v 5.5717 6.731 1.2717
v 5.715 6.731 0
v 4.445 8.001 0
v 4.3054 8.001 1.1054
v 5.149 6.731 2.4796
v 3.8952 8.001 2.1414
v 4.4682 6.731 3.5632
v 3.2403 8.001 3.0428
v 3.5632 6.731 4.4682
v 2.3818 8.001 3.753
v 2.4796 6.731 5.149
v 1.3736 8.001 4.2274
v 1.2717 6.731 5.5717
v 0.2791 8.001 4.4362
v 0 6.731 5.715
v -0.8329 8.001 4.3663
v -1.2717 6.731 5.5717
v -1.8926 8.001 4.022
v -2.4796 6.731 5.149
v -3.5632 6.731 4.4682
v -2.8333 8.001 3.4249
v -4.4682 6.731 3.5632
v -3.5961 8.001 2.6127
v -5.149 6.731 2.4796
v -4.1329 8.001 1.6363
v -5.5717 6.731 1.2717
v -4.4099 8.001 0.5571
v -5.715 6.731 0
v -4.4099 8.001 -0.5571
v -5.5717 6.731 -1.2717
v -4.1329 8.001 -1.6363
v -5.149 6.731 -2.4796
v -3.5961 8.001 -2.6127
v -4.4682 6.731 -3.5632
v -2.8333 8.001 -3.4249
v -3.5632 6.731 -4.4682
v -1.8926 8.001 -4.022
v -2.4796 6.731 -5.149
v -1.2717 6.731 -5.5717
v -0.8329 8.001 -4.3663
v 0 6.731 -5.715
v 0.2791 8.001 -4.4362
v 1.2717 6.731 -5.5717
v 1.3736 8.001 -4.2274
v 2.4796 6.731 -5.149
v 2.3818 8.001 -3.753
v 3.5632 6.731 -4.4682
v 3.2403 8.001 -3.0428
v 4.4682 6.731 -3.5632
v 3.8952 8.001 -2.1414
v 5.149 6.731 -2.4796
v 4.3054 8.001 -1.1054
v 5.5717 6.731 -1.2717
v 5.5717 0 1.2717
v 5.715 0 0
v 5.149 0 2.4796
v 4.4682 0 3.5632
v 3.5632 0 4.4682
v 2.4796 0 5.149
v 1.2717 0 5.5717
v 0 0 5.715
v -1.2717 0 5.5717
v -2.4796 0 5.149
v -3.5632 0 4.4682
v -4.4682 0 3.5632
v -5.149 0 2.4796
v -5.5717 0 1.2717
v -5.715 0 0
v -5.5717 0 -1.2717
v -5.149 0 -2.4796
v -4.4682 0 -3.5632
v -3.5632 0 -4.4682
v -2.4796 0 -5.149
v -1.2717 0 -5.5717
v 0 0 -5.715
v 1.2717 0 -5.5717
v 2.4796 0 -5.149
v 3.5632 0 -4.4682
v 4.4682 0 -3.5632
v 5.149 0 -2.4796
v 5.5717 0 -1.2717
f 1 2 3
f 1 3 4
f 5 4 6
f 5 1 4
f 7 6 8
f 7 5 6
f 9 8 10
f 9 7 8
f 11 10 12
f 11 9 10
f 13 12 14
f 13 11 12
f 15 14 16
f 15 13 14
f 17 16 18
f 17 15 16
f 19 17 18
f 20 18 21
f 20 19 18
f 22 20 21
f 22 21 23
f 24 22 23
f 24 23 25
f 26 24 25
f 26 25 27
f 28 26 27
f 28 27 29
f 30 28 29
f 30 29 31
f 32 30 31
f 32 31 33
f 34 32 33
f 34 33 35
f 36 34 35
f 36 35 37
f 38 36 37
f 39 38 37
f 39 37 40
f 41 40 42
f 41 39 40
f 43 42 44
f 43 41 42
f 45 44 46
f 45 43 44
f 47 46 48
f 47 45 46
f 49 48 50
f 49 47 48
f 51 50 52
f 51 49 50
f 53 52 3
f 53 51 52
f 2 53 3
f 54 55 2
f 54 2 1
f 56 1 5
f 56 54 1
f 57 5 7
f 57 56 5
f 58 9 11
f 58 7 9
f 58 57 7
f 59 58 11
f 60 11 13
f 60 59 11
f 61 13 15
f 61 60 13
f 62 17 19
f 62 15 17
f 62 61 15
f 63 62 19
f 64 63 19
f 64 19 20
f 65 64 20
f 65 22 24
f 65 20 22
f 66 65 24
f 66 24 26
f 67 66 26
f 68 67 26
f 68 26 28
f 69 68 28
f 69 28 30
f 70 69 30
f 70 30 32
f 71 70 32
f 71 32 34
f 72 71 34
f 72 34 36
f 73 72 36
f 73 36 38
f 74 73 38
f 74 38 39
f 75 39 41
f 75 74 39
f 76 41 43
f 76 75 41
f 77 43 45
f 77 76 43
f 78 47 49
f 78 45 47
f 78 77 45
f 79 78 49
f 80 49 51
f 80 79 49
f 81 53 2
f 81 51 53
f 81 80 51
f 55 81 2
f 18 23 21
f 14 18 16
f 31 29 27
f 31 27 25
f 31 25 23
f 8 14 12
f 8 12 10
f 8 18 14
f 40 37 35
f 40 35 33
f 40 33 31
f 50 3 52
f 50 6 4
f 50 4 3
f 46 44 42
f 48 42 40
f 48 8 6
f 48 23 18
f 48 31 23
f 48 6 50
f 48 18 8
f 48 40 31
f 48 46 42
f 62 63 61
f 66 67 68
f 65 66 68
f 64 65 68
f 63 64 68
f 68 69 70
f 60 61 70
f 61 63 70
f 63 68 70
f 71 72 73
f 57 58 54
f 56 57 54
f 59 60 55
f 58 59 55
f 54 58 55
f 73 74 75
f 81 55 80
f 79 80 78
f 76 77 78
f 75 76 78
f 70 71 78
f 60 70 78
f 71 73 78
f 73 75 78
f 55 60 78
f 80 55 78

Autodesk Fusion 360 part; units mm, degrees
sketch "Sketch1" plane through (0, 0, 0) normal (0, 1, 0) x (1, 0, 0)
  circle A0 centre (0, 0) radius 5.715
  dimension "d3" = 11.43
extrude "Extrude1" add sketch "Sketch1" along normal blind 8.001 makes body 1
chamfer "Chamfer1" distance 1.27 angle 45 1 edges at (-5.3283, 8.001, 2.0666) on bodies 1
copy_body "Body->Comp1" bodies 1 removing the originals makes body 2 in component "Peg"
component "Peg" placed x (1, 0, 0) y (0, 1, 0) z (0, 0, 1) at (0, 0, 0)
equation "pegDiameter = 0.45 in"
equation "pegDepth = 0.2 in + boardThickness"
equation "d3 = pegDiameter"
equation "d4 = pegDepth"
equation "boardThickness = 0.115 in"
